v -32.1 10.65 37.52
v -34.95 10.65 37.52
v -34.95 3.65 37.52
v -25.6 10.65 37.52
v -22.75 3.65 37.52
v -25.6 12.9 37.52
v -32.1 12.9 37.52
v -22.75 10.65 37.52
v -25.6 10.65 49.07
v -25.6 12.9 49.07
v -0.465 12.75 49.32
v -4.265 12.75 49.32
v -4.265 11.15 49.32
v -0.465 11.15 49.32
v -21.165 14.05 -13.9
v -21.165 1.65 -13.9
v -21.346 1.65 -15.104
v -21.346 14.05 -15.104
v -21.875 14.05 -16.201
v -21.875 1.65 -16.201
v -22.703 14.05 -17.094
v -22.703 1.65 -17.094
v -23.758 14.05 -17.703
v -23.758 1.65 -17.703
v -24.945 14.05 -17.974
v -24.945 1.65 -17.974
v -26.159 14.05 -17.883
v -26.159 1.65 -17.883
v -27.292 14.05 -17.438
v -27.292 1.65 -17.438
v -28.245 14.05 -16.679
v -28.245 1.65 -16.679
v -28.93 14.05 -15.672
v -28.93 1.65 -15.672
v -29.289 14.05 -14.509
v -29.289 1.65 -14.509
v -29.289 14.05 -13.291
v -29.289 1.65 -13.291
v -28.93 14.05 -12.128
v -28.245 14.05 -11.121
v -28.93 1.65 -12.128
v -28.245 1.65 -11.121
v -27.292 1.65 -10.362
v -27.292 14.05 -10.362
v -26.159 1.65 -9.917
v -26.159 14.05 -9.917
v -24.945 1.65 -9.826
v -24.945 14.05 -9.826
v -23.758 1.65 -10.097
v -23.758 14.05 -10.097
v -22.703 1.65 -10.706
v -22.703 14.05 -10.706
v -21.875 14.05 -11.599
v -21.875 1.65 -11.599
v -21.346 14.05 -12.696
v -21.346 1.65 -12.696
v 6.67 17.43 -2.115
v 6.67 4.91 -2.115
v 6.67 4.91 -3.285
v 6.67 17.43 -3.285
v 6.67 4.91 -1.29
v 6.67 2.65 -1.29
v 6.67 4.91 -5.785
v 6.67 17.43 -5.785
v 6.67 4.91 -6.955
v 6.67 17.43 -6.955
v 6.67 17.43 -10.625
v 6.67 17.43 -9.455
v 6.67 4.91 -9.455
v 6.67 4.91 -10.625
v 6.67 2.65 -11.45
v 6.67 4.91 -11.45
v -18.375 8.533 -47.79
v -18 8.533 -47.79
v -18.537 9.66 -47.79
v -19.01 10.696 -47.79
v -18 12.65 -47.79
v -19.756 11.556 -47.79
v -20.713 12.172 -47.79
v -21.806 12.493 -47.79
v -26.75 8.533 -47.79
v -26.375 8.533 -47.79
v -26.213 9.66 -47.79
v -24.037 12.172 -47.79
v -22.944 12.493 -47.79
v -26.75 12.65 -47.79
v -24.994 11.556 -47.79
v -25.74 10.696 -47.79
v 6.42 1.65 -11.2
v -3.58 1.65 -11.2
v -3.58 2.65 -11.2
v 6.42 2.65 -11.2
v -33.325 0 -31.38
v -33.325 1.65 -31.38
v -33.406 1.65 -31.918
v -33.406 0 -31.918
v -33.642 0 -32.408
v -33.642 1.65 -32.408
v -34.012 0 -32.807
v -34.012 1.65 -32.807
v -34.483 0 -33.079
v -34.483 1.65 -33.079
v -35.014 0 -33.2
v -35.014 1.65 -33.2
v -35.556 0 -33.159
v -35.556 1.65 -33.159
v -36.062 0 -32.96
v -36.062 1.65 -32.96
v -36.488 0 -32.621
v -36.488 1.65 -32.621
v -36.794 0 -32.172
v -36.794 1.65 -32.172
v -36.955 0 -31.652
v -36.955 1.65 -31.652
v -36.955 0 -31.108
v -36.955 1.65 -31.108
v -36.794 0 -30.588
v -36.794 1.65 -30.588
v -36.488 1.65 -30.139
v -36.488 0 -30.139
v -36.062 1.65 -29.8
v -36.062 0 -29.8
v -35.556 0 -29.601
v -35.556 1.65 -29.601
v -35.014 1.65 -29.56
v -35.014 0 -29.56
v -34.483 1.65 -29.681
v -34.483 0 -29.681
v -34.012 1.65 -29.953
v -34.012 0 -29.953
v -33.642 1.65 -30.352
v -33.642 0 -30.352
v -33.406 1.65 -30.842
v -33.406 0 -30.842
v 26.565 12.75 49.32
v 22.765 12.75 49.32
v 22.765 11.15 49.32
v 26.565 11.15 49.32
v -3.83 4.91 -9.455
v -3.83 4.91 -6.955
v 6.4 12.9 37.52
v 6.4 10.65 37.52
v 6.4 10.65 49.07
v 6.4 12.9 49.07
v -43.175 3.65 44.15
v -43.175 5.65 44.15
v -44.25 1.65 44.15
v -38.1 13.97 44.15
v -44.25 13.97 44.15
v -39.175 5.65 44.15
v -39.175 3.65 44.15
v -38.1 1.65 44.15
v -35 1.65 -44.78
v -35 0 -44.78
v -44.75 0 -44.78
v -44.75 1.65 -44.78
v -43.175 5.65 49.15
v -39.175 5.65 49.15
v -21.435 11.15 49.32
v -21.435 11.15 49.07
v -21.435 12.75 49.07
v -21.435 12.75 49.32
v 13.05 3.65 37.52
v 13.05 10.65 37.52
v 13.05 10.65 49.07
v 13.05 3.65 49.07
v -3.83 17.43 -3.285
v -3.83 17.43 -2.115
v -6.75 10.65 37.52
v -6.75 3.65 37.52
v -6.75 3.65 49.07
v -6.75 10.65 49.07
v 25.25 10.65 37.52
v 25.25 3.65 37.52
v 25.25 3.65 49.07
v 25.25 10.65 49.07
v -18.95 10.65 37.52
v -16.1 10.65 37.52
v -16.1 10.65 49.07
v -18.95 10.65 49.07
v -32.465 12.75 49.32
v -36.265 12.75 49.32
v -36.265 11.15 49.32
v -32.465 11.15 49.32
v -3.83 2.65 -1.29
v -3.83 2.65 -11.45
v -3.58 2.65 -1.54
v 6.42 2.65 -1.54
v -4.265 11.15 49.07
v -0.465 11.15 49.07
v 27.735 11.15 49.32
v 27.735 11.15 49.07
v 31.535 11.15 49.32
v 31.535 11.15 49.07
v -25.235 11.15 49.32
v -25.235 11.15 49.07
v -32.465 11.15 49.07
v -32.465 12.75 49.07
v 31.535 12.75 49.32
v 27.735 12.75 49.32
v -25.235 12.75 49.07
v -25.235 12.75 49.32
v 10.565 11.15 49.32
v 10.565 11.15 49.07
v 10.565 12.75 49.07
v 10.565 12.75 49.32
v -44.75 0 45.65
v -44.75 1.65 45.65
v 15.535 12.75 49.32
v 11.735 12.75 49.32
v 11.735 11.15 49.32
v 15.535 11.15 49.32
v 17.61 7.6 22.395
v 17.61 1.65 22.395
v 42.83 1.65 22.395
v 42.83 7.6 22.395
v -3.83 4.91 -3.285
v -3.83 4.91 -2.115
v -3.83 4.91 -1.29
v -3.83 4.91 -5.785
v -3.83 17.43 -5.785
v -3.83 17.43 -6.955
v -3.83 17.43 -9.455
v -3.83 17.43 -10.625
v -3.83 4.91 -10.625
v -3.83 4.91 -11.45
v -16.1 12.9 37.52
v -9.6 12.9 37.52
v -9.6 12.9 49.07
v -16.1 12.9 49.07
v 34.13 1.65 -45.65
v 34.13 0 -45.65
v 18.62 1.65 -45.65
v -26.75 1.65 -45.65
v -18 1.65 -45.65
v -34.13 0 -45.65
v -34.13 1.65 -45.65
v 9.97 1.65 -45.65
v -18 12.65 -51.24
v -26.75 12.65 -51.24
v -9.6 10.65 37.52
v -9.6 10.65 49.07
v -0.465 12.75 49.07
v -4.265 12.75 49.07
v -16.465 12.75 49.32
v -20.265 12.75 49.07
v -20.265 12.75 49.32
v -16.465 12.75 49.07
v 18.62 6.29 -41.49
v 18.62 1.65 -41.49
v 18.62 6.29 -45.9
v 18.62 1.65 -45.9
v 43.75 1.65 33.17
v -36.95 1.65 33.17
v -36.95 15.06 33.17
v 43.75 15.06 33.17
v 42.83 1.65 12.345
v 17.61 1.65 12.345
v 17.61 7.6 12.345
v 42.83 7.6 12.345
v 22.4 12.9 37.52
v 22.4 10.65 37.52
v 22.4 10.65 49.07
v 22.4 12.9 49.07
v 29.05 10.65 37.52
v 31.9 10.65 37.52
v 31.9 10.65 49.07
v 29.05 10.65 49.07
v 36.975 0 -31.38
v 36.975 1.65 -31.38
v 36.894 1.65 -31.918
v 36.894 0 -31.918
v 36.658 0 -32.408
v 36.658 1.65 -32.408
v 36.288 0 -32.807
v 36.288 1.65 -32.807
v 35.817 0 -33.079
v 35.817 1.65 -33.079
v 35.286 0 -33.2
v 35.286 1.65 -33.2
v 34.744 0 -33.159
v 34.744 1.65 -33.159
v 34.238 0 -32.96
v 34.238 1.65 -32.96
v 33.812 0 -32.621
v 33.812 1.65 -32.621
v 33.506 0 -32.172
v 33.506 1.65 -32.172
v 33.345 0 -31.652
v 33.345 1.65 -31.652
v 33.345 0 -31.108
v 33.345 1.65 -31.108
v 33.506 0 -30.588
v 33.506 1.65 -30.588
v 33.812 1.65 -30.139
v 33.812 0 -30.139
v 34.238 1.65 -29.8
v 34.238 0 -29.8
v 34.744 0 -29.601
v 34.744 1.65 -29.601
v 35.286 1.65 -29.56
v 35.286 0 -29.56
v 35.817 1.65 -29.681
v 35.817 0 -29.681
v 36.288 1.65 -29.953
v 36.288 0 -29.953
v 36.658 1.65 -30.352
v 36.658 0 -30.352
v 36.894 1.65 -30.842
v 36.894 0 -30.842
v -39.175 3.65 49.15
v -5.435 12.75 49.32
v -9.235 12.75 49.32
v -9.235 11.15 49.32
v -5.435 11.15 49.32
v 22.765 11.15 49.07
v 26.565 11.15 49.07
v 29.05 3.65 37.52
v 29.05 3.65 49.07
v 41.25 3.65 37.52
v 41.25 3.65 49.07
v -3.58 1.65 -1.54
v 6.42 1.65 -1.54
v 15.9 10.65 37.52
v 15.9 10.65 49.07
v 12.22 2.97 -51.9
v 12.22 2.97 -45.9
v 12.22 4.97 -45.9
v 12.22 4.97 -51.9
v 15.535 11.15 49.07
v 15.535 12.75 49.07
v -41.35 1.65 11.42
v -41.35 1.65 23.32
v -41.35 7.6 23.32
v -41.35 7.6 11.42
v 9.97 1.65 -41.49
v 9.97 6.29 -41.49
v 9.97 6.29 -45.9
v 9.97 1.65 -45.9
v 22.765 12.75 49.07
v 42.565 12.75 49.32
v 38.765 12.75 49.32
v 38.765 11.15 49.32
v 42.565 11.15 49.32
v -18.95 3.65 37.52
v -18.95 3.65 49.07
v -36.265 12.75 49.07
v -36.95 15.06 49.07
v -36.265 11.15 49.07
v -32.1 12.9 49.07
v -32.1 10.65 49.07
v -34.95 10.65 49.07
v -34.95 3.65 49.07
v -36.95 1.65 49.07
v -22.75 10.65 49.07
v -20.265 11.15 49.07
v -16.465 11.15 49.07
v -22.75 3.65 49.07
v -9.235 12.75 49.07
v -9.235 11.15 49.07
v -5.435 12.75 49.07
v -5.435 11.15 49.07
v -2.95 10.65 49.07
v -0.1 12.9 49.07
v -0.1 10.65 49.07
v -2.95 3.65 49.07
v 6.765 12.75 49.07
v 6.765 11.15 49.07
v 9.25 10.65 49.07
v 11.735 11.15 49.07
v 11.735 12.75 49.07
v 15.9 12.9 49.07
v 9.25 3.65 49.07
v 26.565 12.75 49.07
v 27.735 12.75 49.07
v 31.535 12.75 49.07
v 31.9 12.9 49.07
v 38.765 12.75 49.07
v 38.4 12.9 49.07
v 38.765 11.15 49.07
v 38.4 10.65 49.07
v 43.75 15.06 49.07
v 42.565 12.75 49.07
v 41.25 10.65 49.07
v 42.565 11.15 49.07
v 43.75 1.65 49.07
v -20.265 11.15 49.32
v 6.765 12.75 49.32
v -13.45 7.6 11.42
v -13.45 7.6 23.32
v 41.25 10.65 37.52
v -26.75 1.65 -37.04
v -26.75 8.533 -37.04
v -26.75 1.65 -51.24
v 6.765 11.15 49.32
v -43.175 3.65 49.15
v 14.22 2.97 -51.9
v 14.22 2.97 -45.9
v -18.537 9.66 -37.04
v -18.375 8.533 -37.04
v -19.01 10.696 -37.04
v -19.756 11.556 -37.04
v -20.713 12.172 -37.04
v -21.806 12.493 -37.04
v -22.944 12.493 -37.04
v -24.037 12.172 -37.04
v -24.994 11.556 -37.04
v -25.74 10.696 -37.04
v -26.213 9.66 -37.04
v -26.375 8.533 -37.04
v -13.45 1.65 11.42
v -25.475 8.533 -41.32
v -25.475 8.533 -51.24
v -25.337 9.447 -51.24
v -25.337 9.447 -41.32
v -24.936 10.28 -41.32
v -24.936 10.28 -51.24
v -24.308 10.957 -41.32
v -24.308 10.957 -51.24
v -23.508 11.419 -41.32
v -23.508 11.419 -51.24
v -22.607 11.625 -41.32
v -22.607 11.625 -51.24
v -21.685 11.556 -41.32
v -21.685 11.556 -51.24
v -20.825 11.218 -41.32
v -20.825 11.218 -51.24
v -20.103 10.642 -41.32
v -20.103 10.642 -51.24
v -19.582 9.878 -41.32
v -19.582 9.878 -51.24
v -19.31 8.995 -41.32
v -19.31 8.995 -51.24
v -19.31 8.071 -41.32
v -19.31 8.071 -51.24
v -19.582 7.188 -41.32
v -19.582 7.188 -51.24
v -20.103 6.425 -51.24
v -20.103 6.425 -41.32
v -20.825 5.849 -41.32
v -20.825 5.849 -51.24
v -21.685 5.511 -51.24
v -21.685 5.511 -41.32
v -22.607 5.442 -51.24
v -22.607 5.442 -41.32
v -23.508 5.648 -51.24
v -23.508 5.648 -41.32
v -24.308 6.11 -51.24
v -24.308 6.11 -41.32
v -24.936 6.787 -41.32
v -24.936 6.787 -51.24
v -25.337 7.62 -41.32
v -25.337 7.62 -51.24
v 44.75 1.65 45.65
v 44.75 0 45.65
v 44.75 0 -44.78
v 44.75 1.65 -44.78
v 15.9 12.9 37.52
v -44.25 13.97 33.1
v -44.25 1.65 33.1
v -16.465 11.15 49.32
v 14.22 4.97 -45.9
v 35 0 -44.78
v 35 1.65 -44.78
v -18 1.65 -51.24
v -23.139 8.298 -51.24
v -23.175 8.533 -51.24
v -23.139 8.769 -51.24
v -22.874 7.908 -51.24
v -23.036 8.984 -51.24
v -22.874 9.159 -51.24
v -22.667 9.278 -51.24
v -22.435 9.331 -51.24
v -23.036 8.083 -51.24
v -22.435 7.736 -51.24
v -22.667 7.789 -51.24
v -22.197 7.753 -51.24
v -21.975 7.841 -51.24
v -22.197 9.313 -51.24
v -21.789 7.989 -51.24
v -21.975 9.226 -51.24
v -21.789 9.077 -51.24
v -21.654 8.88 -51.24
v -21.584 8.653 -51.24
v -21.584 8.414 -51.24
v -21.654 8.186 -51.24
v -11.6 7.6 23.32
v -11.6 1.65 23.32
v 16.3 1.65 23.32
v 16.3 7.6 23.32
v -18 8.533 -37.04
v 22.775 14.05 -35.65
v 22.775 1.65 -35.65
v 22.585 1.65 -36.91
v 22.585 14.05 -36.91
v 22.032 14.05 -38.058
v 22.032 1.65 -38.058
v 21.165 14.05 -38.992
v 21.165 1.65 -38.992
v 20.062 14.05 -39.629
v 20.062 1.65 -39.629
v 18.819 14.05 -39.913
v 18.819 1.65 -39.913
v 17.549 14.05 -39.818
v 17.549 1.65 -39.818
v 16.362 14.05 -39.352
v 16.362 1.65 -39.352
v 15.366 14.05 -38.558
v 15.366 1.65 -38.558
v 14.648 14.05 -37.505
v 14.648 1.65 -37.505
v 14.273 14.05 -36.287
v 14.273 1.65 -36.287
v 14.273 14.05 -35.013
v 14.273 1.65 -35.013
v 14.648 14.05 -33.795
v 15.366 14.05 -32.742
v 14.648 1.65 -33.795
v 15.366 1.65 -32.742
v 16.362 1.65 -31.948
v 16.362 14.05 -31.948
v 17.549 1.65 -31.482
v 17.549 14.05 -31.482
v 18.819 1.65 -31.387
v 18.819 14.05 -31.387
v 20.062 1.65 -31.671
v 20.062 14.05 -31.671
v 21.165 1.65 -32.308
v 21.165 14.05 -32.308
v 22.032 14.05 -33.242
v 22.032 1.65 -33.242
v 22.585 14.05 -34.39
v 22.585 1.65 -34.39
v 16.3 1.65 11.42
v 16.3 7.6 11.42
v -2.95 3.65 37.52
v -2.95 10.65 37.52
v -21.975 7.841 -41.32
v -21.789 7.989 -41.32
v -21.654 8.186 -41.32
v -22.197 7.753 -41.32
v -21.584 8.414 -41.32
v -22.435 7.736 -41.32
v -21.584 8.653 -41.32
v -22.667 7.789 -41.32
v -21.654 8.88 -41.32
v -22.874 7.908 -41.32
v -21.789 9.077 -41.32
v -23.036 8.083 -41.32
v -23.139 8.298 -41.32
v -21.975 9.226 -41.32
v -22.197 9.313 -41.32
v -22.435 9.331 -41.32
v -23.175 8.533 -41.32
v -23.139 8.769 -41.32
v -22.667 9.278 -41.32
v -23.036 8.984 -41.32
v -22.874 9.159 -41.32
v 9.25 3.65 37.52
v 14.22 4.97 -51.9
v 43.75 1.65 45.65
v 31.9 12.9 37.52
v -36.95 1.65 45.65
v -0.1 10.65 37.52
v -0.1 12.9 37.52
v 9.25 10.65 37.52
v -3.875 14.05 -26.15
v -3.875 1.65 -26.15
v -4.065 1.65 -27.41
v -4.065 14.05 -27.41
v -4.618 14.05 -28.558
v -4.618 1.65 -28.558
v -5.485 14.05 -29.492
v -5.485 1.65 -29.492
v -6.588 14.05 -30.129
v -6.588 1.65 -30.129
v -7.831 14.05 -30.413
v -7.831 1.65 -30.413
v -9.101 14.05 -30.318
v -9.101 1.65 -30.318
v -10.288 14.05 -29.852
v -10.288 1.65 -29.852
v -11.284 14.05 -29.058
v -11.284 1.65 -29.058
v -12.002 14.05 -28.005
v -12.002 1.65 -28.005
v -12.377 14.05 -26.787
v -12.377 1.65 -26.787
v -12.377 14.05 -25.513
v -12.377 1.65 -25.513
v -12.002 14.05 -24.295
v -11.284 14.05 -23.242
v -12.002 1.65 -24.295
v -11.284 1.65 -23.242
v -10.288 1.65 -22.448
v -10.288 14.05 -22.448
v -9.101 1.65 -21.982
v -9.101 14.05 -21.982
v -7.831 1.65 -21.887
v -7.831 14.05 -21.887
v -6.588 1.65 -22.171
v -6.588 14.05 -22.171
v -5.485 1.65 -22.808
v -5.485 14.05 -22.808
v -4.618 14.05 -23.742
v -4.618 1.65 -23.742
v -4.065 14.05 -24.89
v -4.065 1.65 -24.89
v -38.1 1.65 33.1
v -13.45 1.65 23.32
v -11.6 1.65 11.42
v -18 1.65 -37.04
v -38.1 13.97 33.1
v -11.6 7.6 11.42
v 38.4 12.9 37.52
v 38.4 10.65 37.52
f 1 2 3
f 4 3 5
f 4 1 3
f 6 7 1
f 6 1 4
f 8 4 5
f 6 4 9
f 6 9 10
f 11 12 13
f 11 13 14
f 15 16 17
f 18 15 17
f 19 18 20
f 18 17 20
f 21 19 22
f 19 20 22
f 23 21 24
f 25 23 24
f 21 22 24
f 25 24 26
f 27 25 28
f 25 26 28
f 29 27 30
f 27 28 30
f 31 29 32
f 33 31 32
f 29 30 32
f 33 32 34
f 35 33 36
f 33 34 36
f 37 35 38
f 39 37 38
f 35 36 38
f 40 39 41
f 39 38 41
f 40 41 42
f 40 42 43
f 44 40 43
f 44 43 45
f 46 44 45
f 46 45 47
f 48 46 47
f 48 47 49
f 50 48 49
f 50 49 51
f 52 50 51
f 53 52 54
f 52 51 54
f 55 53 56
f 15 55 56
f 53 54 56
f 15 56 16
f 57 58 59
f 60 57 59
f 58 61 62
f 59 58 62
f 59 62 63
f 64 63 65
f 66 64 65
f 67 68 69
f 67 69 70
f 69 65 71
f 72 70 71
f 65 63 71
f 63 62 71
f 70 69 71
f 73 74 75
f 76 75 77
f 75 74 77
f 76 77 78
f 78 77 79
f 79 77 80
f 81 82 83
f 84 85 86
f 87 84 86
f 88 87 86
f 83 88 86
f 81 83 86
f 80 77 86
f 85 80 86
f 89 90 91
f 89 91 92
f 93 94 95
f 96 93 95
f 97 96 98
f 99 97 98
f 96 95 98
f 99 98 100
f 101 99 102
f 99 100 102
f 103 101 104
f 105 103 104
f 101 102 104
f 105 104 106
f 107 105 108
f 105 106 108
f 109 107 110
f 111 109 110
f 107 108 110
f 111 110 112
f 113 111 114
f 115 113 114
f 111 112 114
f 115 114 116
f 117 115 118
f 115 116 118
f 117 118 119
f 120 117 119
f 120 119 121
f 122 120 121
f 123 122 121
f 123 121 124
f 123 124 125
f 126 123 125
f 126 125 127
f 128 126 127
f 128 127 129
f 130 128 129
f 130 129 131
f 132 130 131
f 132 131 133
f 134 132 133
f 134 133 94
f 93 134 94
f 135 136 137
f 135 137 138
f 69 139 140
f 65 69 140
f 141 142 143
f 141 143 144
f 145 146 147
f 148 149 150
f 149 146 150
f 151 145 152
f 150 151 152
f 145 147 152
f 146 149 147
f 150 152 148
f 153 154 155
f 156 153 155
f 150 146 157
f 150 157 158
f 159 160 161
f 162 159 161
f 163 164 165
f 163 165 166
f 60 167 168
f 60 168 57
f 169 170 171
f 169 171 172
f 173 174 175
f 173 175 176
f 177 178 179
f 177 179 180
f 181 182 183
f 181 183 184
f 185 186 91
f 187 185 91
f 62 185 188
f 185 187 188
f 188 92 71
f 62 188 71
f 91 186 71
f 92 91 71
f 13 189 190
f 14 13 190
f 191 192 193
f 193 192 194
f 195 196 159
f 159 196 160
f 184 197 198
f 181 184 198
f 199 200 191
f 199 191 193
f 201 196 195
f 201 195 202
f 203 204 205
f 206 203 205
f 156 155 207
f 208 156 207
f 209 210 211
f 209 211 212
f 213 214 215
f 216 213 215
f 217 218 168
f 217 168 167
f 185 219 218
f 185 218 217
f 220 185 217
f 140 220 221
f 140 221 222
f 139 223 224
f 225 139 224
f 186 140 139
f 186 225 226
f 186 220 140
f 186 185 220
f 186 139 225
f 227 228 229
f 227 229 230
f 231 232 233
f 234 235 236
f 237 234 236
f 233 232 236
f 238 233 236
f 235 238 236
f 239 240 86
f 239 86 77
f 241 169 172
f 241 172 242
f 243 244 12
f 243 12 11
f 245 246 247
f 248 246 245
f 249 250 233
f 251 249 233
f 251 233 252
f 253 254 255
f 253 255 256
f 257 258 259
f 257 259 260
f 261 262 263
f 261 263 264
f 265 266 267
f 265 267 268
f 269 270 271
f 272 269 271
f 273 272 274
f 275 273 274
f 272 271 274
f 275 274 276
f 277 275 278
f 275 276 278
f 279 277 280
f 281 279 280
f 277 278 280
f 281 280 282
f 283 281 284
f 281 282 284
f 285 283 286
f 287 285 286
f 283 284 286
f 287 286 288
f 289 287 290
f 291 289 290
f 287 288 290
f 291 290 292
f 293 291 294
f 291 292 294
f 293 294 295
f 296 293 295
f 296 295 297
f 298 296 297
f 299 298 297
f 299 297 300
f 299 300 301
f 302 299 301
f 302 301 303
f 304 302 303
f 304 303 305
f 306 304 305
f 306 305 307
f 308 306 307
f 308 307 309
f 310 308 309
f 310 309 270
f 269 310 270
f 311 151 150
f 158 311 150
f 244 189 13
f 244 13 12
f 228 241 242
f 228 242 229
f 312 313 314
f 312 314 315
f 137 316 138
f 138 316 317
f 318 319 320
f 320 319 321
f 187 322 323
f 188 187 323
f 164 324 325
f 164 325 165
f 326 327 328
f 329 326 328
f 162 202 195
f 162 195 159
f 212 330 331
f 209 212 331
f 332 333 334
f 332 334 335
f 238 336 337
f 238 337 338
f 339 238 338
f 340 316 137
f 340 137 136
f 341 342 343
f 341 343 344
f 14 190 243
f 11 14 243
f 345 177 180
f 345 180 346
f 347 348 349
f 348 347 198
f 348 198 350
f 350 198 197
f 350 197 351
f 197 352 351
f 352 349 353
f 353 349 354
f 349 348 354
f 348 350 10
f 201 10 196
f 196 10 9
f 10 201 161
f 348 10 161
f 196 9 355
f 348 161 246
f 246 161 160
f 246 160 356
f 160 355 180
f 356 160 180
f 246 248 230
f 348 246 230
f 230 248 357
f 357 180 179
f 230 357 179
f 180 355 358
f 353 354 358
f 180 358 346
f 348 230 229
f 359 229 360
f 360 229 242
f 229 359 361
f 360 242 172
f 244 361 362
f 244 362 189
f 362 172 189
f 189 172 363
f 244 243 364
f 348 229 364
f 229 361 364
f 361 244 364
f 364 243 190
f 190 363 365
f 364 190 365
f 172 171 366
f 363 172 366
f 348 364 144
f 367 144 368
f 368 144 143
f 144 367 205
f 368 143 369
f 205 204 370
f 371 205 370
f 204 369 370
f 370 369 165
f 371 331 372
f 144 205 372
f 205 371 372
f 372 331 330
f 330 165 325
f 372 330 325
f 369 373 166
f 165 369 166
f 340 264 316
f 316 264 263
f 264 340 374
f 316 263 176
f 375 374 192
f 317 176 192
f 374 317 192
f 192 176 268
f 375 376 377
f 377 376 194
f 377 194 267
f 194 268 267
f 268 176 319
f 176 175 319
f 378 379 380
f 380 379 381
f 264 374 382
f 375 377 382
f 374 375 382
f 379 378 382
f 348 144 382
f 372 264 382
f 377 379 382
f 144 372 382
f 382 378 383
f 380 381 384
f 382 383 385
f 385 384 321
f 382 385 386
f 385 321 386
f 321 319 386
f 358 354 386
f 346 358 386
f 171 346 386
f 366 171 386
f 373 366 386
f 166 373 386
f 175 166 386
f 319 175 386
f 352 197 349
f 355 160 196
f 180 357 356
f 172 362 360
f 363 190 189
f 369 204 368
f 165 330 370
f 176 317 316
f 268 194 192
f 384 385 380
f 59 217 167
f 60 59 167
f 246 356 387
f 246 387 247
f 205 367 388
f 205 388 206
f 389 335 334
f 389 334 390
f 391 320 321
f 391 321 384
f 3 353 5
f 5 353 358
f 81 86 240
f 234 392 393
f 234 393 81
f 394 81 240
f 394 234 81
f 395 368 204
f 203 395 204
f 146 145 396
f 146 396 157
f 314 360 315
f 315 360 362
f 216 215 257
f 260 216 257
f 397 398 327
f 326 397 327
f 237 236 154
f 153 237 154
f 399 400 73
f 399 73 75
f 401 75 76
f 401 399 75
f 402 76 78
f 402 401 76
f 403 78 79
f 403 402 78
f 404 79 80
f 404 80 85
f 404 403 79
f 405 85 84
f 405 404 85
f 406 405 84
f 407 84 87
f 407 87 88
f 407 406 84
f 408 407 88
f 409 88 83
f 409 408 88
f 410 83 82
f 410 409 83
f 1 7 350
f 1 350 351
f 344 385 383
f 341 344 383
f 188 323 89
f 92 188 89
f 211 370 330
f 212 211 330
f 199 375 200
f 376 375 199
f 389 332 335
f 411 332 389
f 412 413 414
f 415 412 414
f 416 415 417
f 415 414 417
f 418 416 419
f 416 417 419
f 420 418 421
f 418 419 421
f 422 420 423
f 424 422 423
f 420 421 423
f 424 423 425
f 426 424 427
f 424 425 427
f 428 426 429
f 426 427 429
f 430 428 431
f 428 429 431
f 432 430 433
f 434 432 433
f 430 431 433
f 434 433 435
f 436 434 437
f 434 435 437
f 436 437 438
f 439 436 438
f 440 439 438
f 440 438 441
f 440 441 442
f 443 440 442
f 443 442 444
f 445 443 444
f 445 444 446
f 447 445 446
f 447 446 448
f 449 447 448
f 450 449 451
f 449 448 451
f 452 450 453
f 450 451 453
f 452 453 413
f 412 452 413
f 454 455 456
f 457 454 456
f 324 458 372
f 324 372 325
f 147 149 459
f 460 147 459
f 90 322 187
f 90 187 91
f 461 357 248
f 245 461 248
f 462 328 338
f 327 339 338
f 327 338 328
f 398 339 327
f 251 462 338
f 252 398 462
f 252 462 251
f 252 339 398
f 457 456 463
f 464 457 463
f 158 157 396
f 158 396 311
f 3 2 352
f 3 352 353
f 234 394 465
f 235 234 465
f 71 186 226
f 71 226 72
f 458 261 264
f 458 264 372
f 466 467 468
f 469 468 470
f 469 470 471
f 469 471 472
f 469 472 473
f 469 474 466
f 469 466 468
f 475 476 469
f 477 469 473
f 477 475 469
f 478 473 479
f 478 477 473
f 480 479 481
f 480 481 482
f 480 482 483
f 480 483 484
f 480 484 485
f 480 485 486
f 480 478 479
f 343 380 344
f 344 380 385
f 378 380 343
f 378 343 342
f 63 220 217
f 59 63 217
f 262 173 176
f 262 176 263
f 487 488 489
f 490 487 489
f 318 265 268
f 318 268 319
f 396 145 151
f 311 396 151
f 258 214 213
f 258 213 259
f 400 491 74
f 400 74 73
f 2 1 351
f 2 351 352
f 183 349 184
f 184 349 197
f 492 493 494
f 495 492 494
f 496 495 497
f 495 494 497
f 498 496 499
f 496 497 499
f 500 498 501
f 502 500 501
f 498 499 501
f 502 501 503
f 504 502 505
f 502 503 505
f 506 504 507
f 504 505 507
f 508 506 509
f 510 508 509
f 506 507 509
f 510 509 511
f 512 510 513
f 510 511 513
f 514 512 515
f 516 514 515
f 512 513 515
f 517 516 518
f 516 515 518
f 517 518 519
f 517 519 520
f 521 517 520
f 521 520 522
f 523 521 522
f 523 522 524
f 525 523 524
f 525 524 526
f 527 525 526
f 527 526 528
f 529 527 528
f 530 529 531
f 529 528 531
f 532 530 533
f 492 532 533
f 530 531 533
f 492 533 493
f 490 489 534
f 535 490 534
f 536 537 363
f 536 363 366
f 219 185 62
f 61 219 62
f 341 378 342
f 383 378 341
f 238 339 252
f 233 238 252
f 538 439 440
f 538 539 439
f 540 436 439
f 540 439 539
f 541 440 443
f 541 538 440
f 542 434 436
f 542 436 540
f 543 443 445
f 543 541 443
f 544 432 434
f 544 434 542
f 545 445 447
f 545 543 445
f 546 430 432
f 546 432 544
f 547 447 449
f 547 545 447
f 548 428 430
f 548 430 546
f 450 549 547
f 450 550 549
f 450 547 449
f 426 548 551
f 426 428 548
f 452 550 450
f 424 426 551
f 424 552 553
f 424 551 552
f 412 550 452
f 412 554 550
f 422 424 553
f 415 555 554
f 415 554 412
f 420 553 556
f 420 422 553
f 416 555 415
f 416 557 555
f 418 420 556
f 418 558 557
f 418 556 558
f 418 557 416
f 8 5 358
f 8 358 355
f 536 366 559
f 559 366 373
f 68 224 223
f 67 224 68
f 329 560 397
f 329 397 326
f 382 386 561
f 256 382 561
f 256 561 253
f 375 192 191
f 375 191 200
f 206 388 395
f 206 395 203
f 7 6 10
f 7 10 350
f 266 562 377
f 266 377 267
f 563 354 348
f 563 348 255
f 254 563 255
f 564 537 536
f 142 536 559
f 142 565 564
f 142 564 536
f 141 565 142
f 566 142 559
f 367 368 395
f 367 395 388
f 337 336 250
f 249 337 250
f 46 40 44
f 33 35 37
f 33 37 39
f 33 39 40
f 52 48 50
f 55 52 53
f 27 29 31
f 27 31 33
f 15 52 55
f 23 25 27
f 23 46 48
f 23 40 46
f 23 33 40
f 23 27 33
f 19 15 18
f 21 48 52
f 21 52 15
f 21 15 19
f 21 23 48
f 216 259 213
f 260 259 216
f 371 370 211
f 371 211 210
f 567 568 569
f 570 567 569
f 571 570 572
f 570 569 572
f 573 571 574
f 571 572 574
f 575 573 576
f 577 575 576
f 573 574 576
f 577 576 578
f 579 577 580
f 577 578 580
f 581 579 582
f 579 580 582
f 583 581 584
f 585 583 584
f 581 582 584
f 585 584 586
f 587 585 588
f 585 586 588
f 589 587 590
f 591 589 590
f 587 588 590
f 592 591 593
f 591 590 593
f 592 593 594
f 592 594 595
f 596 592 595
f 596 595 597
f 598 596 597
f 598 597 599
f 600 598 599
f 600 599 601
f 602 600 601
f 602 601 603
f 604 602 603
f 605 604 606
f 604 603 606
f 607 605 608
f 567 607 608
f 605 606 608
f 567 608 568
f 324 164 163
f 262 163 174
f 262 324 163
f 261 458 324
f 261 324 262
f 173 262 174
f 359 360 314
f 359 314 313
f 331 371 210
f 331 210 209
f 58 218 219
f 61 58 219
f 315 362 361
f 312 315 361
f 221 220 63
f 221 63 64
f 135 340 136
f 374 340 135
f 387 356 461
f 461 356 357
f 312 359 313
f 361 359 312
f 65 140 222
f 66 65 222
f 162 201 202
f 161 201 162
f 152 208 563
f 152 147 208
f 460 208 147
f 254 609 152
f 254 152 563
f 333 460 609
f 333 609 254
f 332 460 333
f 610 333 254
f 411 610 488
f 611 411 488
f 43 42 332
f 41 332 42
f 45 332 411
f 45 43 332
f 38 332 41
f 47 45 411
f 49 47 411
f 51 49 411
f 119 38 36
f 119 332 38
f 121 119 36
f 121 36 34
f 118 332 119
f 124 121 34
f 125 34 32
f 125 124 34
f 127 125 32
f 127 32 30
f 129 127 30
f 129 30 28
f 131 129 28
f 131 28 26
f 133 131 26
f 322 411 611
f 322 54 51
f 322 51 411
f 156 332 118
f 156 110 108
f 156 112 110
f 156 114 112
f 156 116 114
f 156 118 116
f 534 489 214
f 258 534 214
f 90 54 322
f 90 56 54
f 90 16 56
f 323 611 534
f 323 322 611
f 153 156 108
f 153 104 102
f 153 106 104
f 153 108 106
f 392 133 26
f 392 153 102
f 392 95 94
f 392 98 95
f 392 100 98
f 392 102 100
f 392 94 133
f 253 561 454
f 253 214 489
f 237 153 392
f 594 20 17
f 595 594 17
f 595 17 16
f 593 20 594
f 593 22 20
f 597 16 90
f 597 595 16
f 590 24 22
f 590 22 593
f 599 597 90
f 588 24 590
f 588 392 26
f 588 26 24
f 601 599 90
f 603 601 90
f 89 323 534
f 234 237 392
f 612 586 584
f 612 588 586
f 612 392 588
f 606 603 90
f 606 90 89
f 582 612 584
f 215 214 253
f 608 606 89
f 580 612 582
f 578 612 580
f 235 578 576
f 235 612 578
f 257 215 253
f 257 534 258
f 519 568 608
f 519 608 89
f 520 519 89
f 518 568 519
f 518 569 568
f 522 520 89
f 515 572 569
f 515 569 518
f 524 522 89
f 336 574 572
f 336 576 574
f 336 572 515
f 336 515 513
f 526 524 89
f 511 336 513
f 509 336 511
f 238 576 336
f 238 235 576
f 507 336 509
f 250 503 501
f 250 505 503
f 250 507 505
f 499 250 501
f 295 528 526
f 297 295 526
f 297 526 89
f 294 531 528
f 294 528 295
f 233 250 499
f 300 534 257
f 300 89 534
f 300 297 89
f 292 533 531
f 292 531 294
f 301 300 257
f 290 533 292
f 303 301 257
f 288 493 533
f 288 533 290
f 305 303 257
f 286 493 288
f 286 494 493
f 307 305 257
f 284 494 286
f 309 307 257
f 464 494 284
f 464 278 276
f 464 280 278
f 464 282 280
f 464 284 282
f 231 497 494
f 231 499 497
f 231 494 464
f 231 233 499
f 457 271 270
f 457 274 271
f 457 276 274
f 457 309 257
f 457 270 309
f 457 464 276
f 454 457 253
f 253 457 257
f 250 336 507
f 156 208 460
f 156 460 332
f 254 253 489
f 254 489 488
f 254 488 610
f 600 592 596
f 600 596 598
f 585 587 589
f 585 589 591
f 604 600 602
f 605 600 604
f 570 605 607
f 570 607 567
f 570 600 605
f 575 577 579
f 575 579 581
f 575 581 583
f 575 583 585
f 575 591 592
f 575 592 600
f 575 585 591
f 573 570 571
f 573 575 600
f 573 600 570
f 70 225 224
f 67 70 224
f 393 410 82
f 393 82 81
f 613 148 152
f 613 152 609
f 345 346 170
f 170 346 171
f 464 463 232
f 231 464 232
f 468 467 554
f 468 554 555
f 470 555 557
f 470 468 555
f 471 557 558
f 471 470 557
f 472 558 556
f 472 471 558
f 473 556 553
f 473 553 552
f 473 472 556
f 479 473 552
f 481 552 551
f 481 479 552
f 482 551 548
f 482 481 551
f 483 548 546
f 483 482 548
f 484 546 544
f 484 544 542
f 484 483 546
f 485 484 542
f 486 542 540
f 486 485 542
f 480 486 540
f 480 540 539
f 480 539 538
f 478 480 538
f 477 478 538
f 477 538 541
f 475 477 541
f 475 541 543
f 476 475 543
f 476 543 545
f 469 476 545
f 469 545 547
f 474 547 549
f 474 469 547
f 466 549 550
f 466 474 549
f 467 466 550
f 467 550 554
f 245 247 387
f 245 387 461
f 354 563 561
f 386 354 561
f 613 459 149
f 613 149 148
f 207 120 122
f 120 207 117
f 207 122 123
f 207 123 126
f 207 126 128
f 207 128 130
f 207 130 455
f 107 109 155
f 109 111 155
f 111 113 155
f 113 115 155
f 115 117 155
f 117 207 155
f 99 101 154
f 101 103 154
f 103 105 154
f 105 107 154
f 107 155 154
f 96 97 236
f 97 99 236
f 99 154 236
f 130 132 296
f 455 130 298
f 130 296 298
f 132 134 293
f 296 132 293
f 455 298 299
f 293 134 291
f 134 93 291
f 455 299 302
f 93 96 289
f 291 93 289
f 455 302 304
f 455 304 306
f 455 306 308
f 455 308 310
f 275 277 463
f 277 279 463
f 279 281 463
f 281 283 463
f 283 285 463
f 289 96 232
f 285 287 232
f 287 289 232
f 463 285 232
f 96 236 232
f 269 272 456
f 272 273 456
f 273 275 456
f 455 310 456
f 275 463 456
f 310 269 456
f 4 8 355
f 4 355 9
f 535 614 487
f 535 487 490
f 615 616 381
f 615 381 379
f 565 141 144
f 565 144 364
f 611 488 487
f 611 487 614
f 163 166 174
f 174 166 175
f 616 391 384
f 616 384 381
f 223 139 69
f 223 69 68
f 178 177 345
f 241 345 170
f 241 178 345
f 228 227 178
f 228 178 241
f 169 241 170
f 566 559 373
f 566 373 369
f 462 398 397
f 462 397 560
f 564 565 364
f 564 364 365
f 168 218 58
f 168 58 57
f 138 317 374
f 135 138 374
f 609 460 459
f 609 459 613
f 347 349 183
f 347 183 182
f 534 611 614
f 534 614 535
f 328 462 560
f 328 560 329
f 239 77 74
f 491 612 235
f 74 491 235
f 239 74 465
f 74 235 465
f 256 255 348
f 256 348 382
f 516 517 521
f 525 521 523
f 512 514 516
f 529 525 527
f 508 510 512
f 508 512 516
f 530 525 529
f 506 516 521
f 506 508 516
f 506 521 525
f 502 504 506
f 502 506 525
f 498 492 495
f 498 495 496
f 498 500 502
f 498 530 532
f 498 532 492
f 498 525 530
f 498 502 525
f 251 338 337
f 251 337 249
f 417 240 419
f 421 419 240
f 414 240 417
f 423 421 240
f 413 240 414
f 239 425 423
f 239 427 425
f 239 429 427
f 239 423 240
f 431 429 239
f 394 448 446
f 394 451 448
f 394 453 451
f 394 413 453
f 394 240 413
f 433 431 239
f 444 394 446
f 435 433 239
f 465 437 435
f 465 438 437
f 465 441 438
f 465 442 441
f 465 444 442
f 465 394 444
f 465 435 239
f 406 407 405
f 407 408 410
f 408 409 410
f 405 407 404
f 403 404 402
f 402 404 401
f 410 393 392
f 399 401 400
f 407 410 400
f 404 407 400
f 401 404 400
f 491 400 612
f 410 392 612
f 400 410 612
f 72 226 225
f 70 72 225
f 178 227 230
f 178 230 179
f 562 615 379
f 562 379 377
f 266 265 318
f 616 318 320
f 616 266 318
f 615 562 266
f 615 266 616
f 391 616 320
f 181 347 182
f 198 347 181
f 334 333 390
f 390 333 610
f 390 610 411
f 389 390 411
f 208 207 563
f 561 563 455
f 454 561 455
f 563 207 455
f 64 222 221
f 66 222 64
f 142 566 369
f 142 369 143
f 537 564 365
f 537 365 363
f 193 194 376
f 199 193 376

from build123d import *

# Parameters (mm, degrees)
BOSS_EXTRUDE1_DEPTH  = 1.65
SKETCH3_W            = 80.7
SKETCH3_H            = 15.9
BOSS_EXTRUDE2_DEPTH  = 13.41
SKETCH4_R            = 1.825
CUT_EXTRUDE1_DEPTH   = 2.65
SKETCH5_W            = 6.15
SKETCH5_H            = 11.05
BOSS_EXTRUDE3_DEPTH  = 12.32
SKETCH6_W            = 4
SKETCH6_H            = 2
BOSS_EXTRUDE4_DEPTH  = 5
CUT_EXTRUDE2_DEPTH   = 11.55
SKETCH8_W            = 27.9
SKETCH8_H            = 11.9
SKETCH8_W_2          = 25.22
SKETCH8_H_2          = 10.05
BOSS_EXTRUDE5_DEPTH  = 5.95
SKETCH9_W            = 10
SKETCH9_H            = 9.66
BOSS_EXTRUDE6_DEPTH  = 1
SKETCH10_W           = 10.5
SKETCH10_H           = 10.16
BOSS_EXTRUDE7_DEPTH  = 14.78
CUT_EXTRUDE3_REACH   = 50.58
SKETCH11_W           = 2.5
SKETCH11_H           = 12.52
SKETCH11_W_2         = 0.825
SKETCH12_R           = 4.275
SKETCH12_R_2         = 4.085
BOSS_EXTRUDE8_DEPTH  = 12.4
SKETCH14_W           = 8.75
SKETCH14_H           = 14.2
BOSS_EXTRUDE9_DEPTH  = 11
SKETCH15_R           = 3.1
SKETCH15_R_2         = 0.8
CUT_EXTRUDE4_DEPTH   = 9.92
CUT_EXTRUDE5_DEPTH   = 10.75
SKETCH18_W           = 8.65
SKETCH18_H           = 4.41
BOSS_EXTRUDE10_DEPTH = 4.64
SKETCH19_W           = 2
SKETCH19_H           = 2
BOSS_EXTRUDE11_DEPTH = 6
SKETCH20_W           = 3.8
SKETCH20_H           = 1.6
BOSS_EXTRUDE12_DEPTH = 0.25


with BuildPart() as part:
    # Sketch1 → Boss-Extrude1 (new body)
    with BuildSketch(Plane(origin=(0, 0, 0), x_dir=(1, 0, 0), z_dir=(0, 1, 0))):
        Polygon((44.75, 44.78), (35, 44.78), (34.13, 45.65), (-34.13, 45.65), (-35, 44.78), (-44.75, 44.78), (-44.75, -45.65), (44.75, -45.65), align=None)
    extrude(amount=BOSS_EXTRUDE1_DEPTH)

    # Sketch3 → Boss-Extrude2 (add)
    with BuildSketch(Plane(origin=(0, 1.65, 0), x_dir=(1, 0, 0), z_dir=(0, 1, 0))):
        with Locations((3.4, -41.12)):
            Rectangle(SKETCH3_W, SKETCH3_H)
    extrude(amount=BOSS_EXTRUDE2_DEPTH)

    # Sketch4 → Cut-Extrude1 (cut, through all)
    with BuildSketch(Plane(origin=(0, 1.65, 0), x_dir=(1, 0, 0), z_dir=(0, 1, 0))):
        with Locations((35.15, 31.38)):
            Circle(SKETCH4_R)
        with Locations((-35.15, 31.38)):
            Circle(SKETCH4_R)
    extrude(amount=-CUT_EXTRUDE1_DEPTH, mode=Mode.SUBTRACT)

    # Sketch5 → Boss-Extrude3 (add)
    with BuildSketch(Plane(origin=(0, 1.65, 0), x_dir=(1, 0, 0), z_dir=(0, 1, 0))):
        with Locations((-41.175, -38.625)):
            Rectangle(SKETCH5_W, SKETCH5_H)
    extrude(amount=BOSS_EXTRUDE3_DEPTH)

    # Sketch6 → Boss-Extrude4 (add)
    with BuildSketch(Plane.XY.offset(44.15)):
        with Locations((-41.175, 4.65)):
            Rectangle(SKETCH6_W, SKETCH6_H)
    extrude(amount=BOSS_EXTRUDE4_DEPTH)

    # Sketch7 → Cut-Extrude2 (cut)
    with BuildSketch(Plane.XY.offset(49.07)):
        Polygon((-34.95, 10.65), (-34.95, 3.65), (-22.75, 3.65), (-22.75, 10.65), (-25.6, 10.65), (-25.6, 12.9), (-32.1, 12.9), (-32.1, 10.65), align=None)
        Polygon((-18.95, 10.65), (-18.95, 3.65), (-6.75, 3.65), (-6.75, 10.65), (-9.6, 10.65), (-9.6, 12.9), (-16.1, 12.9), (-16.1, 10.65), align=None)
        Polygon((-2.95, 10.65), (-2.95, 3.65), (9.25, 3.65), (9.25, 10.65), (6.4, 10.65), (6.4, 12.9), (-0.1, 12.9), (-0.1, 10.65), align=None)
        Polygon((13.05, 10.65), (13.05, 3.65), (25.25, 3.65), (25.25, 10.65), (22.4, 10.65), (22.4, 12.9), (15.9, 12.9), (15.9, 10.65), align=None)
        Polygon((29.05, 10.65), (29.05, 3.65), (41.25, 3.65), (41.25, 10.65), (38.4, 10.65), (38.4, 12.9), (31.9, 12.9), (31.9, 10.65), align=None)
    extrude(amount=-CUT_EXTRUDE2_DEPTH, mode=Mode.SUBTRACT)

    # Sketch8 → Boss-Extrude5 (add)
    with BuildSketch(Plane(origin=(0, 1.65, 0), x_dir=(1, 0, 0), z_dir=(0, 1, 0))):
        with Locations((-27.4, -17.37)):
            Rectangle(SKETCH8_W, SKETCH8_H)
        with Locations((2.35, -17.37)):
            Rectangle(SKETCH8_W, SKETCH8_H)
        with Locations((30.22, -17.37)):
            Rectangle(SKETCH8_W_2, SKETCH8_H_2)
    extrude(amount=BOSS_EXTRUDE5_DEPTH)

    # Sketch9 → Boss-Extrude6 (add)
    with BuildSketch(Plane(origin=(0, 1.65, 0), x_dir=(1, 0, 0), z_dir=(0, 1, 0))):
        with Locations((1.42, 6.37)):
            Rectangle(SKETCH9_W, SKETCH9_H)
    extrude(amount=BOSS_EXTRUDE6_DEPTH)

    # Sketch10 → Boss-Extrude7 (add)
    with BuildSketch(Plane(origin=(0, 2.65, 0), x_dir=(1, 0, 0), z_dir=(0, 1, 0))):
        with Locations((1.42, 6.37)):
            Rectangle(SKETCH10_W, SKETCH10_H)
    extrude(amount=BOSS_EXTRUDE7_DEPTH)

    # Sketch11 → Cut-Extrude3 (cut, up to next)
    with BuildSketch(Plane.ZY.offset(3.83), mode=Mode.PRIVATE) as cut_extrude3_sk1:
        with Locations((-8.205, 11.17)):
            Rectangle(SKETCH11_W, SKETCH11_H)
    cut_extrude3_tool1 = extrude(cut_extrude3_sk1.sketch, amount=-CUT_EXTRUDE3_REACH, mode=Mode.PRIVATE) & part.part
    add(cut_extrude3_tool1.solids().sort_by_distance((-3.83, 11.17, -8.205))[0], mode=Mode.SUBTRACT)
    # Sketch11 → Cut-Extrude3 (cut, up to next)
    with BuildSketch(Plane.ZY.offset(3.83), mode=Mode.PRIVATE) as cut_extrude3_sk2:
        with Locations((-4.535, 11.17)):
            Rectangle(SKETCH11_W, SKETCH11_H)
    cut_extrude3_tool2 = extrude(cut_extrude3_sk2.sketch, amount=-CUT_EXTRUDE3_REACH, mode=Mode.PRIVATE) & part.part
    add(cut_extrude3_tool2.solids().sort_by_distance((-3.83, 11.17, -4.535))[0], mode=Mode.SUBTRACT)
    # Sketch11 → Cut-Extrude3 (cut, up to next)
    with BuildSketch(Plane.ZY.offset(3.83), mode=Mode.PRIVATE) as cut_extrude3_sk3:
        with Locations((-11.0375, 11.17)):
            Rectangle(SKETCH11_W_2, SKETCH11_H)
    cut_extrude3_tool3 = extrude(cut_extrude3_sk3.sketch, amount=-CUT_EXTRUDE3_REACH, mode=Mode.PRIVATE) & part.part
    add(cut_extrude3_tool3.solids().sort_by_distance((-3.83, 11.17, -11.0375))[0], mode=Mode.SUBTRACT)
    # Sketch11 → Cut-Extrude3 (cut, up to next)
    with BuildSketch(Plane.ZY.offset(3.83), mode=Mode.PRIVATE) as cut_extrude3_sk4:
        with Locations((-1.7025, 11.17)):
            Rectangle(SKETCH11_W_2, SKETCH11_H)
    cut_extrude3_tool4 = extrude(cut_extrude3_sk4.sketch, amount=-CUT_EXTRUDE3_REACH, mode=Mode.PRIVATE) & part.part
    add(cut_extrude3_tool4.solids().sort_by_distance((-3.83, 11.17, -1.7025))[0], mode=Mode.SUBTRACT)

    # Sketch12 → Boss-Extrude8 (add)
    with BuildSketch(Plane(origin=(0, 1.65, 0), x_dir=(1, 0, 0), z_dir=(0, 1, 0))):
        with Locations((18.5, 35.65)):
            Circle(SKETCH12_R)
        with Locations((-8.15, 26.15)):
            Circle(SKETCH12_R)
        with Locations((-25.25, 13.9)):
            Circle(SKETCH12_R_2)
    extrude(amount=BOSS_EXTRUDE8_DEPTH)

    # Sketch14 → Boss-Extrude9 (add)
    with BuildSketch(Plane(origin=(0, 1.65, 0), x_dir=(1, 0, 0), z_dir=(0, 1, 0))):
        with Locations((-22.375, 44.14)):
            Rectangle(SKETCH14_W, SKETCH14_H)
    extrude(amount=BOSS_EXTRUDE9_DEPTH)

    # Sketch15 → Cut-Extrude4 (cut)
    with BuildSketch(Plane(origin=(0, 0, -51.24), x_dir=(-1, 0, 0), z_dir=(0, 0, -1))):
        with Locations((22.375, 8.533333602)):
            Circle(SKETCH15_R)
        with Locations((22.375, 8.533333602)):
            Circle(SKETCH15_R_2, mode=Mode.SUBTRACT)
    extrude(amount=-CUT_EXTRUDE4_DEPTH, mode=Mode.SUBTRACT)

    # Sketch17 → Cut-Extrude5 (cut)
    with BuildSketch(Plane.XY.offset(-37.04)):
        with BuildLine():
            Line((-26.375, 8.533333602), (-26.75, 8.533333602))
            Line((-26.75, 8.533333602), (-26.75, 12.65))
            Line((-26.75, 12.65), (-18, 12.65))
            Line((-18, 12.65), (-18, 8.533333602))
            Line((-18, 8.533333602), (-18.375, 8.533333602))
            ThreePointArc((-18.375, 8.533333602), (-22.375, 12.533333602), (-26.375, 8.533333602))
        make_face()
    extrude(amount=-CUT_EXTRUDE5_DEPTH, mode=Mode.SUBTRACT)

    # Sketch18 → Boss-Extrude10 (add)
    with BuildSketch(Plane(origin=(0, 1.65, 0), x_dir=(1, 0, 0), z_dir=(0, 1, 0))):
        with Locations((14.295, 43.695)):
            Rectangle(SKETCH18_W, SKETCH18_H)
    extrude(amount=BOSS_EXTRUDE10_DEPTH)

    # Sketch19 → Boss-Extrude11 (add)
    with BuildSketch(Plane(origin=(0, 0, -45.9), x_dir=(-1, 0, 0), z_dir=(0, 0, -1))):
        with Locations((-13.22, 3.97)):
            Rectangle(SKETCH19_W, SKETCH19_H)
    extrude(amount=BOSS_EXTRUDE11_DEPTH)

    # Sketch20 → Boss-Extrude12 (add)
    with BuildSketch(Plane.XY.offset(49.07)):
        with Locations((-34.365, 11.95)):
            Rectangle(SKETCH20_W, SKETCH20_H)
        with Locations((-23.335, 11.95)):
            Rectangle(SKETCH20_W, SKETCH20_H)
        with Locations((-7.335, 11.95)):
            Rectangle(SKETCH20_W, SKETCH20_H)
        with Locations((-18.365, 11.95)):
            Rectangle(SKETCH20_W, SKETCH20_H)
        with Locations((8.665, 11.95)):
            Rectangle(SKETCH20_W, SKETCH20_H)
        with Locations((-2.365, 11.95)):
            Rectangle(SKETCH20_W, SKETCH20_H)
        with Locations((24.665, 11.95)):
            Rectangle(SKETCH20_W, SKETCH20_H)
        with Locations((13.635, 11.95)):
            Rectangle(SKETCH20_W, SKETCH20_H)
        with Locations((40.665, 11.95)):
            Rectangle(SKETCH20_W, SKETCH20_H)
        with Locations((29.635, 11.95)):
            Rectangle(SKETCH20_W, SKETCH20_H)
    extrude(amount=BOSS_EXTRUDE12_DEPTH)


solid = part.part
